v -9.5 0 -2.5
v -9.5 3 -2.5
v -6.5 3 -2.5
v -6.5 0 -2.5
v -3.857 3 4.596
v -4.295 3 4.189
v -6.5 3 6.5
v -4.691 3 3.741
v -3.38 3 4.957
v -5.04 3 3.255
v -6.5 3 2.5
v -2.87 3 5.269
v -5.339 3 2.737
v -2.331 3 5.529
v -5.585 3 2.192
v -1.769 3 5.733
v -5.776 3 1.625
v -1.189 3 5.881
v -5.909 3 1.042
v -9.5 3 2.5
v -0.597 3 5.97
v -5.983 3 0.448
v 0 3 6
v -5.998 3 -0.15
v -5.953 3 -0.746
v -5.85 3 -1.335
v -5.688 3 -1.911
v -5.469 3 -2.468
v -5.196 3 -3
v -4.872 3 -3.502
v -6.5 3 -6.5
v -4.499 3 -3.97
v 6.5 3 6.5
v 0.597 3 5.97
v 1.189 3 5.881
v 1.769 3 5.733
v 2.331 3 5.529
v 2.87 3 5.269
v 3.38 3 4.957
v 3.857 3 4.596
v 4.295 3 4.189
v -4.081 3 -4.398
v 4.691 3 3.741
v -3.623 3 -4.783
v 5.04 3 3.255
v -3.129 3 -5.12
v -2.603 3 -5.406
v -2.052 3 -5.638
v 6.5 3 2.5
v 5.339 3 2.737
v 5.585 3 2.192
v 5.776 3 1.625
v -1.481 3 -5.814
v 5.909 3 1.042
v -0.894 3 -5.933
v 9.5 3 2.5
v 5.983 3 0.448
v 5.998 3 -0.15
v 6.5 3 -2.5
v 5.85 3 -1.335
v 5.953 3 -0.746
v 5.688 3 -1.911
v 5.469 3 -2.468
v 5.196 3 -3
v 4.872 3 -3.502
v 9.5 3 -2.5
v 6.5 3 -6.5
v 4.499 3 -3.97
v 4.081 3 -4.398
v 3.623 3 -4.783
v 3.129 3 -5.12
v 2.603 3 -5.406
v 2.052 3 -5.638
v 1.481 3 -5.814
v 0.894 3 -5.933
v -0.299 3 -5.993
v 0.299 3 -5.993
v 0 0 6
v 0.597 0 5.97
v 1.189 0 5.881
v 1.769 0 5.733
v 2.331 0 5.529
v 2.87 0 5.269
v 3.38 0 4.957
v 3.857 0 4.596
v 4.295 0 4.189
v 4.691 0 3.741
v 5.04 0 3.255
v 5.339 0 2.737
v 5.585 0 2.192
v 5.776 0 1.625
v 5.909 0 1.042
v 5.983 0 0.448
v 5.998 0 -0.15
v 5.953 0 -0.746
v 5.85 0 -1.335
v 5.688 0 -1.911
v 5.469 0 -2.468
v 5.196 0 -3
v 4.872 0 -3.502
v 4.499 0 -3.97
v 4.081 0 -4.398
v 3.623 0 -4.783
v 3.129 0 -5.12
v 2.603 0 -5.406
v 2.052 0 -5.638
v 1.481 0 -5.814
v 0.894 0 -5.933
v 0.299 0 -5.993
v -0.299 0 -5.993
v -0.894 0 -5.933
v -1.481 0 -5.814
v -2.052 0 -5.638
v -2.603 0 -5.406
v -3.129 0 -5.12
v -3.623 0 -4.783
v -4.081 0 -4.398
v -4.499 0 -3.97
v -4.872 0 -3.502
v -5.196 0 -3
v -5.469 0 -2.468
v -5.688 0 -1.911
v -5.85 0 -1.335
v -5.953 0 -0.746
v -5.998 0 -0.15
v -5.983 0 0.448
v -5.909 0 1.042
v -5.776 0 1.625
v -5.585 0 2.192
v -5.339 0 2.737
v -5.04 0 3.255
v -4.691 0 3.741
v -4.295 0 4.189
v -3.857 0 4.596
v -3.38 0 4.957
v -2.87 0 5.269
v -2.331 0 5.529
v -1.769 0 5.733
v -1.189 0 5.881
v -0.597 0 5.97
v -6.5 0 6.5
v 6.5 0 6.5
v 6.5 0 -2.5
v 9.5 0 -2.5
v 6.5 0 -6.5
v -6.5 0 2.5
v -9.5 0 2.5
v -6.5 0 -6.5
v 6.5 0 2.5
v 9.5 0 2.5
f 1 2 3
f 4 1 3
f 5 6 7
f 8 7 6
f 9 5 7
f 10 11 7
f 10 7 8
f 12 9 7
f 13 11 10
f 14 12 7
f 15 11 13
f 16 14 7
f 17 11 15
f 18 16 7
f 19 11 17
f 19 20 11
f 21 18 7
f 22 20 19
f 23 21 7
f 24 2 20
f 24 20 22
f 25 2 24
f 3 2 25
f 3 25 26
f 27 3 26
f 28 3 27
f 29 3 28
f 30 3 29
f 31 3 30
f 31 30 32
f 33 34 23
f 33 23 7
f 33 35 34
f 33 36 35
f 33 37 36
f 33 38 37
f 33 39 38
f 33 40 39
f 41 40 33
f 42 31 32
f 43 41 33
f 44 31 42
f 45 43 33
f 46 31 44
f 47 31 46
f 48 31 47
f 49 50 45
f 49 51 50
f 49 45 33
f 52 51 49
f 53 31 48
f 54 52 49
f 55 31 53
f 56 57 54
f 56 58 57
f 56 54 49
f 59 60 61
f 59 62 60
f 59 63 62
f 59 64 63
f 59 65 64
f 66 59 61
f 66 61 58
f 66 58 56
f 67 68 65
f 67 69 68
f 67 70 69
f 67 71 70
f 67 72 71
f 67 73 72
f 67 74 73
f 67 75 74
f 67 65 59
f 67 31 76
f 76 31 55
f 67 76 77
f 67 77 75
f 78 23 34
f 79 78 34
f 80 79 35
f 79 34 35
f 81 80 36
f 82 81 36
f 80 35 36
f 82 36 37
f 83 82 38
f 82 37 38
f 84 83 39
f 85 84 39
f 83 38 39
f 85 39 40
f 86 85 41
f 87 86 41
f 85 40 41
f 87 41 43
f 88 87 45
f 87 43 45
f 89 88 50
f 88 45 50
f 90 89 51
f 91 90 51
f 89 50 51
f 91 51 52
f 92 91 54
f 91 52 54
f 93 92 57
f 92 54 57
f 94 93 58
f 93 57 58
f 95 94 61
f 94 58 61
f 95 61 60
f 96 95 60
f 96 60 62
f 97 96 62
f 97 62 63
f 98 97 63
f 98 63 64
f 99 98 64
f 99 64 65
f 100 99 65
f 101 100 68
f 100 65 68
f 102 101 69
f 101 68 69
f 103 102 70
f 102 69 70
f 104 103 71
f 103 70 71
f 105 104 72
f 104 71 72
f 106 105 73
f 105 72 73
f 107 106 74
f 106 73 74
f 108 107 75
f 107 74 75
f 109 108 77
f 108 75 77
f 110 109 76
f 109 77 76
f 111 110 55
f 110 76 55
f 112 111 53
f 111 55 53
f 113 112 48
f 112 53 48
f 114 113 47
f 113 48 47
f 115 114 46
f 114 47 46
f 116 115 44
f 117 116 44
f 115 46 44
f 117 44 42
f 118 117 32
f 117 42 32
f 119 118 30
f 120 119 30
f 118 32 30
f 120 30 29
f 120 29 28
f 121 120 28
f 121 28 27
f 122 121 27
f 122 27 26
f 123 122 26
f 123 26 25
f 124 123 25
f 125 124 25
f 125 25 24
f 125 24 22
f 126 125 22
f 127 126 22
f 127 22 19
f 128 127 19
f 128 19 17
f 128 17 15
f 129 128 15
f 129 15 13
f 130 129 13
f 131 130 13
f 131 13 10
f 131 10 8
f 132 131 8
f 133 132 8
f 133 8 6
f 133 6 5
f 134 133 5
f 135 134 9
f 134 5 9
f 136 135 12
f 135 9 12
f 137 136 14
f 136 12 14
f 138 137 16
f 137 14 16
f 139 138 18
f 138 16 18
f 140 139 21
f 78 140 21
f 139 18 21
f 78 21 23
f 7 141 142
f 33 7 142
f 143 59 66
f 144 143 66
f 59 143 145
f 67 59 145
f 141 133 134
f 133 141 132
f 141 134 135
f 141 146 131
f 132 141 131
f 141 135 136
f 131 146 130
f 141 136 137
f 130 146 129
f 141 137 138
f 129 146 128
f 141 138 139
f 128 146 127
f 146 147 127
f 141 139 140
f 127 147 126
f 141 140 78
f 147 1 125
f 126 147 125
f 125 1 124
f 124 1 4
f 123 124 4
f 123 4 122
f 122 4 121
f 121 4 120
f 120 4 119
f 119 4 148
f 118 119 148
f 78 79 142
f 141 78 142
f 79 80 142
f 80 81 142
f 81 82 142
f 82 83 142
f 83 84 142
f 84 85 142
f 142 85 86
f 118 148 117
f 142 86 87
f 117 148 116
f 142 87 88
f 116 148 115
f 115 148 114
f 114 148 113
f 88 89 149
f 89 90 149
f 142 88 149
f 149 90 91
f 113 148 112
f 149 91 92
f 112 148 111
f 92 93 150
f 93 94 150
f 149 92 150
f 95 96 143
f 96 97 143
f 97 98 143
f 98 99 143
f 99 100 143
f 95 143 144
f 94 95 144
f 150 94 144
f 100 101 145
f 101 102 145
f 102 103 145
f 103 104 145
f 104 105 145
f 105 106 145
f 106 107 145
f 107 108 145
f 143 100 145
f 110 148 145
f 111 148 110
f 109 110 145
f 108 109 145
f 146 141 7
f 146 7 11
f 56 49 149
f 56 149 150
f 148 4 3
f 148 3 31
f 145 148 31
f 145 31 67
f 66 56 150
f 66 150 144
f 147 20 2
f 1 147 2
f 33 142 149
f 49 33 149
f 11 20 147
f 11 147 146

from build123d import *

# Parameters (mm, degrees)
SKETCH1_W           = 13
SKETCH1_H           = 13
BOSS_EXTRUDE1_DEPTH = 3
SKETCH2_R           = 6
CUT_EXTRUDE1_DEPTH  = 3
SKETCH4_W           = 3
SKETCH4_H           = 5
BOSS_EXTRUDE2_DEPTH = 3


with BuildPart() as part:
    # Sketch1 → Boss-Extrude1 (new body)
    with BuildSketch(Plane(origin=(0, 0, 0), x_dir=(1, 0, 0), z_dir=(0, 1, 0))):
        Rectangle(SKETCH1_W, SKETCH1_H)
    extrude(amount=BOSS_EXTRUDE1_DEPTH)

    # Sketch2 → Cut-Extrude1 (cut)
    with BuildSketch(Plane(origin=(0, 3, 0), x_dir=(1, 0, 0), z_dir=(0, 1, 0))):
        with Locations(Location((0, 0, 0), (0, 0, 270))):
            Circle(SKETCH2_R)
    extrude(amount=-CUT_EXTRUDE1_DEPTH, mode=Mode.SUBTRACT)

    # Sketch4 → Boss-Extrude2 (add)
    with BuildSketch(Plane(origin=(0, 3, 0), x_dir=(1, 0, 0), z_dir=(0, 1, 0))):
        with Locations((-8, 0)):
            Rectangle(SKETCH4_W, SKETCH4_H)
        with Locations((8, 0)):
            Rectangle(SKETCH4_W, SKETCH4_H)
    extrude(amount=-BOSS_EXTRUDE2_DEPTH)


solid = part.part
